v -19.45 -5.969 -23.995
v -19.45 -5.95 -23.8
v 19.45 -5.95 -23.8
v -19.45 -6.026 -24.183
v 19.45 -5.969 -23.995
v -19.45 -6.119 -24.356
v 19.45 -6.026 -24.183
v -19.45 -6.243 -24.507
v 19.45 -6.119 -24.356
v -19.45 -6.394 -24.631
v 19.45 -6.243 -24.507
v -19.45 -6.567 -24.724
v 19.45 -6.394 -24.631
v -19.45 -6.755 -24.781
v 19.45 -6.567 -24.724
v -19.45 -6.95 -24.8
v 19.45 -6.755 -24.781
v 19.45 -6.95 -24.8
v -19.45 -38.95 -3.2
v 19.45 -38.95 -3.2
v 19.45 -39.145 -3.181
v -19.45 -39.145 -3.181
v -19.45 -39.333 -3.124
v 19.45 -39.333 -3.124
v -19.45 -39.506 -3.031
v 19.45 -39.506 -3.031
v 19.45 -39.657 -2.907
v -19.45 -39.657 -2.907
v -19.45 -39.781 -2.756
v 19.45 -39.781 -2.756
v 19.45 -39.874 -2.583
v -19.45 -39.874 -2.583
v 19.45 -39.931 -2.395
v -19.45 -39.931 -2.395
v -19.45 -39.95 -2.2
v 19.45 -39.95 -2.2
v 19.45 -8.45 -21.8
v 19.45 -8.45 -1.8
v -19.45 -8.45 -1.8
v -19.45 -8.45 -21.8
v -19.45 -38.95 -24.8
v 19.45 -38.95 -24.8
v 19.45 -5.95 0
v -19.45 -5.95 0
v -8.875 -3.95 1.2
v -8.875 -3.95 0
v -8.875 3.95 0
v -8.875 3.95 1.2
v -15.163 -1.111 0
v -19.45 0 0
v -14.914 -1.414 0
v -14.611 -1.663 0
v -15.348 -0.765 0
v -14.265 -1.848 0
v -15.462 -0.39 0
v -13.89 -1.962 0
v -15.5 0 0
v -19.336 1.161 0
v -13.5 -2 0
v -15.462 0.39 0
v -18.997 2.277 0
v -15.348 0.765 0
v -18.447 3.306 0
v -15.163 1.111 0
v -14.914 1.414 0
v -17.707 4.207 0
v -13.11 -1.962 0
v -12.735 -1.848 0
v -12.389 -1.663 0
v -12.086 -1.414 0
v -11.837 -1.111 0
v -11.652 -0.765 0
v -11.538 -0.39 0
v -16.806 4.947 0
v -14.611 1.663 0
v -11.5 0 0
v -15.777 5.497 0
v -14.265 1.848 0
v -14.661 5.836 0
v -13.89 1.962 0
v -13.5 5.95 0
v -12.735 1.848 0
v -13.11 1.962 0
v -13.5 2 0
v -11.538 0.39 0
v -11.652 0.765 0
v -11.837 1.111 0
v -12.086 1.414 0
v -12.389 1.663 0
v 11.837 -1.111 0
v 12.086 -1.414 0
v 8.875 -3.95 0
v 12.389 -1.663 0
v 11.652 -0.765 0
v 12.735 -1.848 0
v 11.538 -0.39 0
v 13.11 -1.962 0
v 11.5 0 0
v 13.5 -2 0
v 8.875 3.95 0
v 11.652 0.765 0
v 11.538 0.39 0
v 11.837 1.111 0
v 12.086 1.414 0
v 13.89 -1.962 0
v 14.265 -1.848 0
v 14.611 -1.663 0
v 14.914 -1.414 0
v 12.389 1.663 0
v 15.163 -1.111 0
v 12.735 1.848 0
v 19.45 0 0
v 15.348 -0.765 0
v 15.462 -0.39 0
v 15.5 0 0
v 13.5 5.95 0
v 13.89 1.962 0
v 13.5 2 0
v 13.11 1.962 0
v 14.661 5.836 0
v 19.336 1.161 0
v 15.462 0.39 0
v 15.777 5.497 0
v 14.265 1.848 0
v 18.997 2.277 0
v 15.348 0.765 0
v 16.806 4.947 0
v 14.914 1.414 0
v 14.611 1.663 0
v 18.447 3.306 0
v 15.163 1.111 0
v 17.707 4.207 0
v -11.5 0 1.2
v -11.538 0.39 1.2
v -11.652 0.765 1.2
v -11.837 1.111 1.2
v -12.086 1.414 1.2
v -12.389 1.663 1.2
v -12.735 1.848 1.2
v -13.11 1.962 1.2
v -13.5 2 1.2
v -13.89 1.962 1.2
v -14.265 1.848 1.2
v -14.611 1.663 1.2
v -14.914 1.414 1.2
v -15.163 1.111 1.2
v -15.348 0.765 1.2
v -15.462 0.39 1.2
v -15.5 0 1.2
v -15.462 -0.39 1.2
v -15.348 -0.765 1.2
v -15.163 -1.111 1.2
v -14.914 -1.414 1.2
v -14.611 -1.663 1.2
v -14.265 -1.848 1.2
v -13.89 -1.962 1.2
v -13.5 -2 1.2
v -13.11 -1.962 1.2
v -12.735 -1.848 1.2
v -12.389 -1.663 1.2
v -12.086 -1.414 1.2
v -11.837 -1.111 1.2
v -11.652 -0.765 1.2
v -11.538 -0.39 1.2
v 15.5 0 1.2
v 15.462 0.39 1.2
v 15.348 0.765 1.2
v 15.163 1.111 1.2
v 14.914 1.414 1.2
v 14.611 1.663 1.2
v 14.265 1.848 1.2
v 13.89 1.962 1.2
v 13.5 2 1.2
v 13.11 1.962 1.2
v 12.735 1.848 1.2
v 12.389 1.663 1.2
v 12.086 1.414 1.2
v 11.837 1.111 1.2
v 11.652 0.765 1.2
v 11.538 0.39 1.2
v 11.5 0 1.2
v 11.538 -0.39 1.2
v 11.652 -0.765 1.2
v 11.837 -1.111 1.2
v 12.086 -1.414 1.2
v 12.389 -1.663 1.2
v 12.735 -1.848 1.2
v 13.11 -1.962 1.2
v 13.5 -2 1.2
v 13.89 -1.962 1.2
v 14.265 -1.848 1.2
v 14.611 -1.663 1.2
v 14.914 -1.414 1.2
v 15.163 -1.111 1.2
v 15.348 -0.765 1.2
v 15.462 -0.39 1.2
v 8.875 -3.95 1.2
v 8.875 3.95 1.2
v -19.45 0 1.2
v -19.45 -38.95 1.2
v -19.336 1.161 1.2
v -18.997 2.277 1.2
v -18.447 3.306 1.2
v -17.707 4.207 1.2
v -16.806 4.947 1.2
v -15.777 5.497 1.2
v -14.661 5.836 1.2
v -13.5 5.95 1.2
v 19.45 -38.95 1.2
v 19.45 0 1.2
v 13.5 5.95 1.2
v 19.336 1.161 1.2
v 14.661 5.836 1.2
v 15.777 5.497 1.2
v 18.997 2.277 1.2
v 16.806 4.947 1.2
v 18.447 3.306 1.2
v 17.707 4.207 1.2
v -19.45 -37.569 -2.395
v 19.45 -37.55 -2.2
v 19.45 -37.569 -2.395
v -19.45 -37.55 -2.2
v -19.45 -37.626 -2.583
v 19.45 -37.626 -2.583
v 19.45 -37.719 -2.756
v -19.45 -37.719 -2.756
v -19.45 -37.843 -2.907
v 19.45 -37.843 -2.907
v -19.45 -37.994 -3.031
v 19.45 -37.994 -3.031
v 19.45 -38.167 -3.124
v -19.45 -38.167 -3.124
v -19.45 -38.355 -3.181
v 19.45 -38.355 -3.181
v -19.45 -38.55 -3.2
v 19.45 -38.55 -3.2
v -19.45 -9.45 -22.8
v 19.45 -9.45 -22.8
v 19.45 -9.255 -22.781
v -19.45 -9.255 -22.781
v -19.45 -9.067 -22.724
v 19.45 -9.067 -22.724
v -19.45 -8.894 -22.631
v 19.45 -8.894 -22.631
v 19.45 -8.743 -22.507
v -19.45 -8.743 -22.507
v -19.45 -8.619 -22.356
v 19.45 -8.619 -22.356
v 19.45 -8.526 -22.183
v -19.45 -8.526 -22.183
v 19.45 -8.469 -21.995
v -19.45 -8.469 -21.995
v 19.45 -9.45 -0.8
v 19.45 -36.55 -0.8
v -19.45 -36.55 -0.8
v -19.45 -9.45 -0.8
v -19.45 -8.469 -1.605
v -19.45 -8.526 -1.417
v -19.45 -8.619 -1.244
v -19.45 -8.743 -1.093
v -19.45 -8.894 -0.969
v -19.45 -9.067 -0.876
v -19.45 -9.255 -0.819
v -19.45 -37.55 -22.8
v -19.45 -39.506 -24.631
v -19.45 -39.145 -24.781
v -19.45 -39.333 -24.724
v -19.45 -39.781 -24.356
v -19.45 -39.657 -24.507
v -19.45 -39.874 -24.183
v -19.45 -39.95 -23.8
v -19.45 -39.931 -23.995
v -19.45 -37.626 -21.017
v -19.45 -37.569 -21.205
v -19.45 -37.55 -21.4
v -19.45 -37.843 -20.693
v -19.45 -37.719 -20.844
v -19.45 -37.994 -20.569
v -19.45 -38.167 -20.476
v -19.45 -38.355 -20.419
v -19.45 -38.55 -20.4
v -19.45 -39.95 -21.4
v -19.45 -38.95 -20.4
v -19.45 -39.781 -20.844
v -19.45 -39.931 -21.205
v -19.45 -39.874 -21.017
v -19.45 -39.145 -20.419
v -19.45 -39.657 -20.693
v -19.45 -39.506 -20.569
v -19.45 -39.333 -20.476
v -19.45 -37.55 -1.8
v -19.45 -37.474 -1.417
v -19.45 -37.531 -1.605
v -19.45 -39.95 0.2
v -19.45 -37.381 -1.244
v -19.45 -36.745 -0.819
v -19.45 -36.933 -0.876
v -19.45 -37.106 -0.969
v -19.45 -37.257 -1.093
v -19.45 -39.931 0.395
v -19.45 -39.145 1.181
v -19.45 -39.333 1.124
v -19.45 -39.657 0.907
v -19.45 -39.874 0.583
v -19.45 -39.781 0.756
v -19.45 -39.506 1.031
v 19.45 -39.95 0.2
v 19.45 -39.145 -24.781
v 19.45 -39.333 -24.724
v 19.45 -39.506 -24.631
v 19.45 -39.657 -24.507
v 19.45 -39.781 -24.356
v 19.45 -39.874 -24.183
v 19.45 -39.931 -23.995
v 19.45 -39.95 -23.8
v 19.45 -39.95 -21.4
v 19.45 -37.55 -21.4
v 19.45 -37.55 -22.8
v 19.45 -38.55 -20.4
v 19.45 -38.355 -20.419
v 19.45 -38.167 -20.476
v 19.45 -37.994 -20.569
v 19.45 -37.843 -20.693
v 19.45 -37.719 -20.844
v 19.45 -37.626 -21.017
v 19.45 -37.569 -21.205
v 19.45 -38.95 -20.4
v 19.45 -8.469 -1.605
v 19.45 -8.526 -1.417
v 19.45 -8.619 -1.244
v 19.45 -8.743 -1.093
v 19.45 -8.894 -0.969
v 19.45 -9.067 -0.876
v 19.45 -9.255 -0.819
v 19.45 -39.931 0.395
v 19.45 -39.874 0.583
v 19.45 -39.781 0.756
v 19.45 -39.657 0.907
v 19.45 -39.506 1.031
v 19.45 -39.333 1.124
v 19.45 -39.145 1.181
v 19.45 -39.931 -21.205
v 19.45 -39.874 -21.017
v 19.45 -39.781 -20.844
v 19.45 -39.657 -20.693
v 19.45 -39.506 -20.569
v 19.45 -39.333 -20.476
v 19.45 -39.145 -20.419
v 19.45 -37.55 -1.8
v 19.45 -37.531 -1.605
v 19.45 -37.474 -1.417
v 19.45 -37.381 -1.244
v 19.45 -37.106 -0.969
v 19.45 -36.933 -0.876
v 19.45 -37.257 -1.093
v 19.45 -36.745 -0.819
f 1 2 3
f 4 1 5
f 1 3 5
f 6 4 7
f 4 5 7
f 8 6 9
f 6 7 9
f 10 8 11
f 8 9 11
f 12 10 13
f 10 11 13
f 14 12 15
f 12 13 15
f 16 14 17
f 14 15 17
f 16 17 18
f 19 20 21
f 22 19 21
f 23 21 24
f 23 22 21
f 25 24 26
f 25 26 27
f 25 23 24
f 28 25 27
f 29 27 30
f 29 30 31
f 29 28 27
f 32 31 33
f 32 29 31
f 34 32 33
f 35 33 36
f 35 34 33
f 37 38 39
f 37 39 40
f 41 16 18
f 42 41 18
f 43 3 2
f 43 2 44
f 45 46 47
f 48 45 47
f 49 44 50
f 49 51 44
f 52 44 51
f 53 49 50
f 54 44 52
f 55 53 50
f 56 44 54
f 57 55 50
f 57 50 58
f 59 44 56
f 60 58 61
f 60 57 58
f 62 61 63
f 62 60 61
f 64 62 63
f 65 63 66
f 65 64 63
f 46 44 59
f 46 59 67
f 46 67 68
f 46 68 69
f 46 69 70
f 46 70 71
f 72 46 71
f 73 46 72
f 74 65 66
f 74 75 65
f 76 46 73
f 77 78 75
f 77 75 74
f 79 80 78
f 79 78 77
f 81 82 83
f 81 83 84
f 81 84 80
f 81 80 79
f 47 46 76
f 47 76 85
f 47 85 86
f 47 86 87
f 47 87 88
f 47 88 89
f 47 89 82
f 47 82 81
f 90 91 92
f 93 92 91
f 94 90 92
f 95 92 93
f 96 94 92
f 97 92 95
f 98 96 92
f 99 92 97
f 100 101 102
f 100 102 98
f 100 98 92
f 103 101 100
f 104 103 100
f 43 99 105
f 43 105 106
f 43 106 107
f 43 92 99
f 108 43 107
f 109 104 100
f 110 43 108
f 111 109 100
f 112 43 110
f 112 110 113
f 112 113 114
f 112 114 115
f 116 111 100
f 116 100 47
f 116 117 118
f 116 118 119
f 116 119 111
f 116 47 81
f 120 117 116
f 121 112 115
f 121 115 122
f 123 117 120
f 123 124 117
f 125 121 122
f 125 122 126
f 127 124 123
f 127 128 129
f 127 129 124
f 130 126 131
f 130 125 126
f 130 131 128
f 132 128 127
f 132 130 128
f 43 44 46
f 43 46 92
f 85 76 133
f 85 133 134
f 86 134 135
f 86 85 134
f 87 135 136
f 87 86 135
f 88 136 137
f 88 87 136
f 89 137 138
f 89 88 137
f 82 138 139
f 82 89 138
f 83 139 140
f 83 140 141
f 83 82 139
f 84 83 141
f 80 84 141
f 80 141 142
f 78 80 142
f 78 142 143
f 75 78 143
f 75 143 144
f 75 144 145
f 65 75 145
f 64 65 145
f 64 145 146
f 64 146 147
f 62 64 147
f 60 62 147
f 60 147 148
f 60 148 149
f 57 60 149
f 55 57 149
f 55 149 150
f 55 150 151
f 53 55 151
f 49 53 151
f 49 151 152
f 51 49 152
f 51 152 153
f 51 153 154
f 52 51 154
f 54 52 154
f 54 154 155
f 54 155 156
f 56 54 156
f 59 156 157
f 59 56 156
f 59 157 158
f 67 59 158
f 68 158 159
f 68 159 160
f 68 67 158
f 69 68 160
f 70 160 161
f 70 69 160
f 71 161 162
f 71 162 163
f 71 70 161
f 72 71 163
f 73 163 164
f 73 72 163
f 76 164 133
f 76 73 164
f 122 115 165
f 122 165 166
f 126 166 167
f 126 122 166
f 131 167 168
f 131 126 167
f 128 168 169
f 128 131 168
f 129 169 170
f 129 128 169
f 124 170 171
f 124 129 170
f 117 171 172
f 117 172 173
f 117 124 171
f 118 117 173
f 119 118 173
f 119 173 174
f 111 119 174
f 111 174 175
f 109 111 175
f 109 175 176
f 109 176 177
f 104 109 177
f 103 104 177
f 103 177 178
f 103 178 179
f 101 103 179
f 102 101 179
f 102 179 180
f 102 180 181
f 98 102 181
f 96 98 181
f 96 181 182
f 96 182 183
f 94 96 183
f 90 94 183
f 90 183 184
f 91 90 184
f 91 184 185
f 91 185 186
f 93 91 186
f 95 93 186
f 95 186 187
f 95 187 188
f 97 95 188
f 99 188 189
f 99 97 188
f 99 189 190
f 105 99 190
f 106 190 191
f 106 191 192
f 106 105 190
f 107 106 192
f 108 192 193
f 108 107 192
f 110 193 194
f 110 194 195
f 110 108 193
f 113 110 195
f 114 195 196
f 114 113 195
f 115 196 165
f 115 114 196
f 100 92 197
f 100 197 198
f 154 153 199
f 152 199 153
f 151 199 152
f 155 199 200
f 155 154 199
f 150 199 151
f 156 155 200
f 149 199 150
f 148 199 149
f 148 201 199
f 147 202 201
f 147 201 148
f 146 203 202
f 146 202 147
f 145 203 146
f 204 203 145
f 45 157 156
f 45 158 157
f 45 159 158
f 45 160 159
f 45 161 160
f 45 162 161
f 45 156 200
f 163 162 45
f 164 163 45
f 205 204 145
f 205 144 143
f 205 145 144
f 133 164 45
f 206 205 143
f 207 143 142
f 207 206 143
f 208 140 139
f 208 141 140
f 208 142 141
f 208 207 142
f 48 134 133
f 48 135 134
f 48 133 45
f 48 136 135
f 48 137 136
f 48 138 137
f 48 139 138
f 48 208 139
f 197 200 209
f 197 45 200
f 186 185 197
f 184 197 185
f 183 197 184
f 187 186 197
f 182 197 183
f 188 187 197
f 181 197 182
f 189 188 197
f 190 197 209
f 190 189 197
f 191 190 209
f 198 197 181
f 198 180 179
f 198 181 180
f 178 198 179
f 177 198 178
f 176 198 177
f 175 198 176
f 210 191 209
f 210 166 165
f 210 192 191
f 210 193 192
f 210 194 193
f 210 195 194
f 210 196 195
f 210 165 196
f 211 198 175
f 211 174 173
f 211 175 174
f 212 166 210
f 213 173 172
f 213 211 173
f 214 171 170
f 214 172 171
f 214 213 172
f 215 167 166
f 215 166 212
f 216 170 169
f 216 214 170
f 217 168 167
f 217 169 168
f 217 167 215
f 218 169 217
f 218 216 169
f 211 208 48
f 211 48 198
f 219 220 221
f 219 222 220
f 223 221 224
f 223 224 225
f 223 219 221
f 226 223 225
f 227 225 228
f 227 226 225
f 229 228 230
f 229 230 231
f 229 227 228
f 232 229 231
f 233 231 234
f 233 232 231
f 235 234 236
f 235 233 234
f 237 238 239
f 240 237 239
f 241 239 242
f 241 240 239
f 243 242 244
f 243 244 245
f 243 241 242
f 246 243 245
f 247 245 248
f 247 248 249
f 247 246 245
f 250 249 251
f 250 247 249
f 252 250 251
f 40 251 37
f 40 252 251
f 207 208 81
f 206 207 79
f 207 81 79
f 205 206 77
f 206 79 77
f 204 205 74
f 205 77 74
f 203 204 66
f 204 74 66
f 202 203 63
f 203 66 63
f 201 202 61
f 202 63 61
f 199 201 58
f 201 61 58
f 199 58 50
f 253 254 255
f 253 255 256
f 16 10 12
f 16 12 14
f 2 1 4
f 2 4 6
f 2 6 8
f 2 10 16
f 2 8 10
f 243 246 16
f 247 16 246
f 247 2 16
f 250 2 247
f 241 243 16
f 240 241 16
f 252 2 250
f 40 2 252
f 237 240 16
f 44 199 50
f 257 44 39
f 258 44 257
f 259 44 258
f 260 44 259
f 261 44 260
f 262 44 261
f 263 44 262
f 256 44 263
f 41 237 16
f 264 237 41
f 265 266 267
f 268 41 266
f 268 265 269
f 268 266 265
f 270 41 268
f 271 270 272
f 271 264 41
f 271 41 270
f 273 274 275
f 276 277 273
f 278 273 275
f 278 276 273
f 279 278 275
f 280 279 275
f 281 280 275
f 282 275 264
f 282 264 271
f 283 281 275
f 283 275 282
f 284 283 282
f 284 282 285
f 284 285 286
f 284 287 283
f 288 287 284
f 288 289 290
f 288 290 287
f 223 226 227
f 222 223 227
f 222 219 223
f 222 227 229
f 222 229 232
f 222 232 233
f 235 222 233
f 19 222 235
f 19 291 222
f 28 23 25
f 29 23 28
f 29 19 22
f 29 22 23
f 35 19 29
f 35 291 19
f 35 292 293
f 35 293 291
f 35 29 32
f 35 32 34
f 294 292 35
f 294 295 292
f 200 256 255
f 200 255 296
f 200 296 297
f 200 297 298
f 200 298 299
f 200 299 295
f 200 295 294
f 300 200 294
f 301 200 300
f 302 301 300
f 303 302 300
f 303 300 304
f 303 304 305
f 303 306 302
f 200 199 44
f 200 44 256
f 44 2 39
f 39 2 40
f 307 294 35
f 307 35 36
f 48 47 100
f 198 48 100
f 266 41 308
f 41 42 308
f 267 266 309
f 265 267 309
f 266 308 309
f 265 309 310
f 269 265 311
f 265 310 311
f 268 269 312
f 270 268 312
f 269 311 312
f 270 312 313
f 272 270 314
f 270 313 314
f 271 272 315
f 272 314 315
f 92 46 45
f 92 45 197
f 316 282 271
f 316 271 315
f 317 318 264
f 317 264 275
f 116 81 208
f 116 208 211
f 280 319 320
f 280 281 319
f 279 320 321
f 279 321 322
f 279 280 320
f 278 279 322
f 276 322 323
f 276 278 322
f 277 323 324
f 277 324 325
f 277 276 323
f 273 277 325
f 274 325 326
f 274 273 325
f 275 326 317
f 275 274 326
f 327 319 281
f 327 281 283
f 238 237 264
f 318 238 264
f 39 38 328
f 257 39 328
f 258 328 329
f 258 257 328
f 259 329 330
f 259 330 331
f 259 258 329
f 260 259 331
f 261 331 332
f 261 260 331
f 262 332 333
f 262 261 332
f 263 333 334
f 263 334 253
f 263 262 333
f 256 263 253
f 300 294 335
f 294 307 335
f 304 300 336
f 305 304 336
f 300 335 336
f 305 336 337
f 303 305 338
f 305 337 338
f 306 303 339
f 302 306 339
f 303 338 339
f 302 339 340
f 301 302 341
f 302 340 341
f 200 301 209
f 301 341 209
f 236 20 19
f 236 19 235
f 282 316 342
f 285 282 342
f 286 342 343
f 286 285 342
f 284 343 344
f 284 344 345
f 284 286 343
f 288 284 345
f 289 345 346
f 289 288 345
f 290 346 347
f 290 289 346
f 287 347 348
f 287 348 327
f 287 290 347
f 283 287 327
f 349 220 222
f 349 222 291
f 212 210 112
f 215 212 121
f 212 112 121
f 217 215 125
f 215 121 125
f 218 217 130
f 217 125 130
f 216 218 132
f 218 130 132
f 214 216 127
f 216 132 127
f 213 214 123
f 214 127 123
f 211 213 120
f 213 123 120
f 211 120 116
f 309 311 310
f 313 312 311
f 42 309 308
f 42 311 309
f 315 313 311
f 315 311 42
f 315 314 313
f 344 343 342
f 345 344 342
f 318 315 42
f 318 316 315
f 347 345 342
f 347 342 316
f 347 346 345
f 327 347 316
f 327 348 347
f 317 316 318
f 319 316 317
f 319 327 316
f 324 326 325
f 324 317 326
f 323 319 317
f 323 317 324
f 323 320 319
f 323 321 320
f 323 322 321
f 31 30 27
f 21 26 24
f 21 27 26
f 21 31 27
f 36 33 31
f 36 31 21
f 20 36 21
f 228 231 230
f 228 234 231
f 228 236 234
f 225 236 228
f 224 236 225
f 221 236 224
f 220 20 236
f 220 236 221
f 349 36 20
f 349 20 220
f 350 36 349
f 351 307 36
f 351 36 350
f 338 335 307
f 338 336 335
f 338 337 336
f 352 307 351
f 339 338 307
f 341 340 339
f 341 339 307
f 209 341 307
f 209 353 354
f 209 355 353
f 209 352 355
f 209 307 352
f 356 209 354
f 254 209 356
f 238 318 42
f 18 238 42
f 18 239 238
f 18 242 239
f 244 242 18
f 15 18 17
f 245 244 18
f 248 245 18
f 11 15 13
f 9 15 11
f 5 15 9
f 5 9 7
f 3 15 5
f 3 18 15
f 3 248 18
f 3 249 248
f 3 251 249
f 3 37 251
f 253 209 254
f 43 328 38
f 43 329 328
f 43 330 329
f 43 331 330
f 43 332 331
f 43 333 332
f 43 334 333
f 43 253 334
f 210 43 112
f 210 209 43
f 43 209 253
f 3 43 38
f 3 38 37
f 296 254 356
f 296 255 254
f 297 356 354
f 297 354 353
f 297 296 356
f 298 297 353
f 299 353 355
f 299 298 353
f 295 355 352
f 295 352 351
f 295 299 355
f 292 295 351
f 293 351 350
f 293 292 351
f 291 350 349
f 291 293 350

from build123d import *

# Parameters (mm, degrees)
SKETCH_R     = 2
SKETCH_W     = 17.75
SKETCH_H     = 7.9
PAD_DEPTH    = 1.2
PAD001_DEPTH = 26
SKETCH002_W  = 5.95
SKETCH002_H  = 24.8
POCKET_DEPTH = 38.901
FILLET_R     = 1


with BuildPart() as part:
    # Sketch → Pad (new body)
    with BuildSketch(Plane.XY):
        with BuildLine():
            ThreePointArc((-13.5, 5.95), (-19.45, 0), (-13.5, -5.95))
            Line((-13.5, -5.95), (13.5, -5.95))
            ThreePointArc((13.5, -5.95), (19.45, 0), (13.5, 5.95))
            Line((-13.5, 5.95), (13.5, 5.95))
        make_face()
        with Locations((-13.5, 0)):
            Circle(SKETCH_R, mode=Mode.SUBTRACT)
        with Locations((13.5, 0)):
            Circle(SKETCH_R, mode=Mode.SUBTRACT)
        Rectangle(SKETCH_W, SKETCH_H, mode=Mode.SUBTRACT)
    extrude(amount=PAD_DEPTH)

    # Sketch001 (on Face12 of Pad) → Pad001 (join)
    with BuildSketch(Plane.XY.offset(1.2)):
        with BuildLine():
            Line((-19.45, 0), (-19.45, -39.95))
            Line((-19.45, -39.95), (19.45, -39.95))
            Line((19.45, -39.95), (19.45, 0))
            ThreePointArc((13.5, -5.95), (17.707285, -4.207285), (19.45, 0))
            Line((-13.5, -5.95), (13.5, -5.95))
            ThreePointArc((-19.45, 0), (-17.707285, -4.207285), (-13.5, -5.95))
        make_face()
    extrude(amount=-PAD001_DEPTH)

    # Sketch002 (on Face17 of Pad001) → Pocket (cut, through all)
    with BuildSketch(Plane.YZ.offset(19.45)):
        with Locations((-2.975, -12.4)):
            Rectangle(SKETCH002_W, SKETCH002_H)
        Polygon((-39.95, -3.2), (-37.55, -3.2), (-37.55, -0.8), (-8.45, -0.8), (-8.45, -22.8), (-37.55, -22.8), (-37.55, -20.4), (-39.95, -20.4), align=None)
    extrude(amount=-POCKET_DEPTH, mode=Mode.SUBTRACT)

    # Fillet
    fillet_edges = [part.edges().sort_by_distance(p)[0] for p in [
        (0, -8.45, -22.8),
        (0, -8.45, -0.8),
        (0, -37.55, -0.8),
        (0, -37.55, -3.2),
        (0, -39.95, -3.2),
        (0, -37.55, -20.4),
        (0, -39.95, -24.8),
        (0, -5.95, -24.8),
        (0, -39.95, -20.4),
        (0, -39.95, 1.2),
    ]]
    fillet(fillet_edges, radius=FILLET_R)


solid = part.part
